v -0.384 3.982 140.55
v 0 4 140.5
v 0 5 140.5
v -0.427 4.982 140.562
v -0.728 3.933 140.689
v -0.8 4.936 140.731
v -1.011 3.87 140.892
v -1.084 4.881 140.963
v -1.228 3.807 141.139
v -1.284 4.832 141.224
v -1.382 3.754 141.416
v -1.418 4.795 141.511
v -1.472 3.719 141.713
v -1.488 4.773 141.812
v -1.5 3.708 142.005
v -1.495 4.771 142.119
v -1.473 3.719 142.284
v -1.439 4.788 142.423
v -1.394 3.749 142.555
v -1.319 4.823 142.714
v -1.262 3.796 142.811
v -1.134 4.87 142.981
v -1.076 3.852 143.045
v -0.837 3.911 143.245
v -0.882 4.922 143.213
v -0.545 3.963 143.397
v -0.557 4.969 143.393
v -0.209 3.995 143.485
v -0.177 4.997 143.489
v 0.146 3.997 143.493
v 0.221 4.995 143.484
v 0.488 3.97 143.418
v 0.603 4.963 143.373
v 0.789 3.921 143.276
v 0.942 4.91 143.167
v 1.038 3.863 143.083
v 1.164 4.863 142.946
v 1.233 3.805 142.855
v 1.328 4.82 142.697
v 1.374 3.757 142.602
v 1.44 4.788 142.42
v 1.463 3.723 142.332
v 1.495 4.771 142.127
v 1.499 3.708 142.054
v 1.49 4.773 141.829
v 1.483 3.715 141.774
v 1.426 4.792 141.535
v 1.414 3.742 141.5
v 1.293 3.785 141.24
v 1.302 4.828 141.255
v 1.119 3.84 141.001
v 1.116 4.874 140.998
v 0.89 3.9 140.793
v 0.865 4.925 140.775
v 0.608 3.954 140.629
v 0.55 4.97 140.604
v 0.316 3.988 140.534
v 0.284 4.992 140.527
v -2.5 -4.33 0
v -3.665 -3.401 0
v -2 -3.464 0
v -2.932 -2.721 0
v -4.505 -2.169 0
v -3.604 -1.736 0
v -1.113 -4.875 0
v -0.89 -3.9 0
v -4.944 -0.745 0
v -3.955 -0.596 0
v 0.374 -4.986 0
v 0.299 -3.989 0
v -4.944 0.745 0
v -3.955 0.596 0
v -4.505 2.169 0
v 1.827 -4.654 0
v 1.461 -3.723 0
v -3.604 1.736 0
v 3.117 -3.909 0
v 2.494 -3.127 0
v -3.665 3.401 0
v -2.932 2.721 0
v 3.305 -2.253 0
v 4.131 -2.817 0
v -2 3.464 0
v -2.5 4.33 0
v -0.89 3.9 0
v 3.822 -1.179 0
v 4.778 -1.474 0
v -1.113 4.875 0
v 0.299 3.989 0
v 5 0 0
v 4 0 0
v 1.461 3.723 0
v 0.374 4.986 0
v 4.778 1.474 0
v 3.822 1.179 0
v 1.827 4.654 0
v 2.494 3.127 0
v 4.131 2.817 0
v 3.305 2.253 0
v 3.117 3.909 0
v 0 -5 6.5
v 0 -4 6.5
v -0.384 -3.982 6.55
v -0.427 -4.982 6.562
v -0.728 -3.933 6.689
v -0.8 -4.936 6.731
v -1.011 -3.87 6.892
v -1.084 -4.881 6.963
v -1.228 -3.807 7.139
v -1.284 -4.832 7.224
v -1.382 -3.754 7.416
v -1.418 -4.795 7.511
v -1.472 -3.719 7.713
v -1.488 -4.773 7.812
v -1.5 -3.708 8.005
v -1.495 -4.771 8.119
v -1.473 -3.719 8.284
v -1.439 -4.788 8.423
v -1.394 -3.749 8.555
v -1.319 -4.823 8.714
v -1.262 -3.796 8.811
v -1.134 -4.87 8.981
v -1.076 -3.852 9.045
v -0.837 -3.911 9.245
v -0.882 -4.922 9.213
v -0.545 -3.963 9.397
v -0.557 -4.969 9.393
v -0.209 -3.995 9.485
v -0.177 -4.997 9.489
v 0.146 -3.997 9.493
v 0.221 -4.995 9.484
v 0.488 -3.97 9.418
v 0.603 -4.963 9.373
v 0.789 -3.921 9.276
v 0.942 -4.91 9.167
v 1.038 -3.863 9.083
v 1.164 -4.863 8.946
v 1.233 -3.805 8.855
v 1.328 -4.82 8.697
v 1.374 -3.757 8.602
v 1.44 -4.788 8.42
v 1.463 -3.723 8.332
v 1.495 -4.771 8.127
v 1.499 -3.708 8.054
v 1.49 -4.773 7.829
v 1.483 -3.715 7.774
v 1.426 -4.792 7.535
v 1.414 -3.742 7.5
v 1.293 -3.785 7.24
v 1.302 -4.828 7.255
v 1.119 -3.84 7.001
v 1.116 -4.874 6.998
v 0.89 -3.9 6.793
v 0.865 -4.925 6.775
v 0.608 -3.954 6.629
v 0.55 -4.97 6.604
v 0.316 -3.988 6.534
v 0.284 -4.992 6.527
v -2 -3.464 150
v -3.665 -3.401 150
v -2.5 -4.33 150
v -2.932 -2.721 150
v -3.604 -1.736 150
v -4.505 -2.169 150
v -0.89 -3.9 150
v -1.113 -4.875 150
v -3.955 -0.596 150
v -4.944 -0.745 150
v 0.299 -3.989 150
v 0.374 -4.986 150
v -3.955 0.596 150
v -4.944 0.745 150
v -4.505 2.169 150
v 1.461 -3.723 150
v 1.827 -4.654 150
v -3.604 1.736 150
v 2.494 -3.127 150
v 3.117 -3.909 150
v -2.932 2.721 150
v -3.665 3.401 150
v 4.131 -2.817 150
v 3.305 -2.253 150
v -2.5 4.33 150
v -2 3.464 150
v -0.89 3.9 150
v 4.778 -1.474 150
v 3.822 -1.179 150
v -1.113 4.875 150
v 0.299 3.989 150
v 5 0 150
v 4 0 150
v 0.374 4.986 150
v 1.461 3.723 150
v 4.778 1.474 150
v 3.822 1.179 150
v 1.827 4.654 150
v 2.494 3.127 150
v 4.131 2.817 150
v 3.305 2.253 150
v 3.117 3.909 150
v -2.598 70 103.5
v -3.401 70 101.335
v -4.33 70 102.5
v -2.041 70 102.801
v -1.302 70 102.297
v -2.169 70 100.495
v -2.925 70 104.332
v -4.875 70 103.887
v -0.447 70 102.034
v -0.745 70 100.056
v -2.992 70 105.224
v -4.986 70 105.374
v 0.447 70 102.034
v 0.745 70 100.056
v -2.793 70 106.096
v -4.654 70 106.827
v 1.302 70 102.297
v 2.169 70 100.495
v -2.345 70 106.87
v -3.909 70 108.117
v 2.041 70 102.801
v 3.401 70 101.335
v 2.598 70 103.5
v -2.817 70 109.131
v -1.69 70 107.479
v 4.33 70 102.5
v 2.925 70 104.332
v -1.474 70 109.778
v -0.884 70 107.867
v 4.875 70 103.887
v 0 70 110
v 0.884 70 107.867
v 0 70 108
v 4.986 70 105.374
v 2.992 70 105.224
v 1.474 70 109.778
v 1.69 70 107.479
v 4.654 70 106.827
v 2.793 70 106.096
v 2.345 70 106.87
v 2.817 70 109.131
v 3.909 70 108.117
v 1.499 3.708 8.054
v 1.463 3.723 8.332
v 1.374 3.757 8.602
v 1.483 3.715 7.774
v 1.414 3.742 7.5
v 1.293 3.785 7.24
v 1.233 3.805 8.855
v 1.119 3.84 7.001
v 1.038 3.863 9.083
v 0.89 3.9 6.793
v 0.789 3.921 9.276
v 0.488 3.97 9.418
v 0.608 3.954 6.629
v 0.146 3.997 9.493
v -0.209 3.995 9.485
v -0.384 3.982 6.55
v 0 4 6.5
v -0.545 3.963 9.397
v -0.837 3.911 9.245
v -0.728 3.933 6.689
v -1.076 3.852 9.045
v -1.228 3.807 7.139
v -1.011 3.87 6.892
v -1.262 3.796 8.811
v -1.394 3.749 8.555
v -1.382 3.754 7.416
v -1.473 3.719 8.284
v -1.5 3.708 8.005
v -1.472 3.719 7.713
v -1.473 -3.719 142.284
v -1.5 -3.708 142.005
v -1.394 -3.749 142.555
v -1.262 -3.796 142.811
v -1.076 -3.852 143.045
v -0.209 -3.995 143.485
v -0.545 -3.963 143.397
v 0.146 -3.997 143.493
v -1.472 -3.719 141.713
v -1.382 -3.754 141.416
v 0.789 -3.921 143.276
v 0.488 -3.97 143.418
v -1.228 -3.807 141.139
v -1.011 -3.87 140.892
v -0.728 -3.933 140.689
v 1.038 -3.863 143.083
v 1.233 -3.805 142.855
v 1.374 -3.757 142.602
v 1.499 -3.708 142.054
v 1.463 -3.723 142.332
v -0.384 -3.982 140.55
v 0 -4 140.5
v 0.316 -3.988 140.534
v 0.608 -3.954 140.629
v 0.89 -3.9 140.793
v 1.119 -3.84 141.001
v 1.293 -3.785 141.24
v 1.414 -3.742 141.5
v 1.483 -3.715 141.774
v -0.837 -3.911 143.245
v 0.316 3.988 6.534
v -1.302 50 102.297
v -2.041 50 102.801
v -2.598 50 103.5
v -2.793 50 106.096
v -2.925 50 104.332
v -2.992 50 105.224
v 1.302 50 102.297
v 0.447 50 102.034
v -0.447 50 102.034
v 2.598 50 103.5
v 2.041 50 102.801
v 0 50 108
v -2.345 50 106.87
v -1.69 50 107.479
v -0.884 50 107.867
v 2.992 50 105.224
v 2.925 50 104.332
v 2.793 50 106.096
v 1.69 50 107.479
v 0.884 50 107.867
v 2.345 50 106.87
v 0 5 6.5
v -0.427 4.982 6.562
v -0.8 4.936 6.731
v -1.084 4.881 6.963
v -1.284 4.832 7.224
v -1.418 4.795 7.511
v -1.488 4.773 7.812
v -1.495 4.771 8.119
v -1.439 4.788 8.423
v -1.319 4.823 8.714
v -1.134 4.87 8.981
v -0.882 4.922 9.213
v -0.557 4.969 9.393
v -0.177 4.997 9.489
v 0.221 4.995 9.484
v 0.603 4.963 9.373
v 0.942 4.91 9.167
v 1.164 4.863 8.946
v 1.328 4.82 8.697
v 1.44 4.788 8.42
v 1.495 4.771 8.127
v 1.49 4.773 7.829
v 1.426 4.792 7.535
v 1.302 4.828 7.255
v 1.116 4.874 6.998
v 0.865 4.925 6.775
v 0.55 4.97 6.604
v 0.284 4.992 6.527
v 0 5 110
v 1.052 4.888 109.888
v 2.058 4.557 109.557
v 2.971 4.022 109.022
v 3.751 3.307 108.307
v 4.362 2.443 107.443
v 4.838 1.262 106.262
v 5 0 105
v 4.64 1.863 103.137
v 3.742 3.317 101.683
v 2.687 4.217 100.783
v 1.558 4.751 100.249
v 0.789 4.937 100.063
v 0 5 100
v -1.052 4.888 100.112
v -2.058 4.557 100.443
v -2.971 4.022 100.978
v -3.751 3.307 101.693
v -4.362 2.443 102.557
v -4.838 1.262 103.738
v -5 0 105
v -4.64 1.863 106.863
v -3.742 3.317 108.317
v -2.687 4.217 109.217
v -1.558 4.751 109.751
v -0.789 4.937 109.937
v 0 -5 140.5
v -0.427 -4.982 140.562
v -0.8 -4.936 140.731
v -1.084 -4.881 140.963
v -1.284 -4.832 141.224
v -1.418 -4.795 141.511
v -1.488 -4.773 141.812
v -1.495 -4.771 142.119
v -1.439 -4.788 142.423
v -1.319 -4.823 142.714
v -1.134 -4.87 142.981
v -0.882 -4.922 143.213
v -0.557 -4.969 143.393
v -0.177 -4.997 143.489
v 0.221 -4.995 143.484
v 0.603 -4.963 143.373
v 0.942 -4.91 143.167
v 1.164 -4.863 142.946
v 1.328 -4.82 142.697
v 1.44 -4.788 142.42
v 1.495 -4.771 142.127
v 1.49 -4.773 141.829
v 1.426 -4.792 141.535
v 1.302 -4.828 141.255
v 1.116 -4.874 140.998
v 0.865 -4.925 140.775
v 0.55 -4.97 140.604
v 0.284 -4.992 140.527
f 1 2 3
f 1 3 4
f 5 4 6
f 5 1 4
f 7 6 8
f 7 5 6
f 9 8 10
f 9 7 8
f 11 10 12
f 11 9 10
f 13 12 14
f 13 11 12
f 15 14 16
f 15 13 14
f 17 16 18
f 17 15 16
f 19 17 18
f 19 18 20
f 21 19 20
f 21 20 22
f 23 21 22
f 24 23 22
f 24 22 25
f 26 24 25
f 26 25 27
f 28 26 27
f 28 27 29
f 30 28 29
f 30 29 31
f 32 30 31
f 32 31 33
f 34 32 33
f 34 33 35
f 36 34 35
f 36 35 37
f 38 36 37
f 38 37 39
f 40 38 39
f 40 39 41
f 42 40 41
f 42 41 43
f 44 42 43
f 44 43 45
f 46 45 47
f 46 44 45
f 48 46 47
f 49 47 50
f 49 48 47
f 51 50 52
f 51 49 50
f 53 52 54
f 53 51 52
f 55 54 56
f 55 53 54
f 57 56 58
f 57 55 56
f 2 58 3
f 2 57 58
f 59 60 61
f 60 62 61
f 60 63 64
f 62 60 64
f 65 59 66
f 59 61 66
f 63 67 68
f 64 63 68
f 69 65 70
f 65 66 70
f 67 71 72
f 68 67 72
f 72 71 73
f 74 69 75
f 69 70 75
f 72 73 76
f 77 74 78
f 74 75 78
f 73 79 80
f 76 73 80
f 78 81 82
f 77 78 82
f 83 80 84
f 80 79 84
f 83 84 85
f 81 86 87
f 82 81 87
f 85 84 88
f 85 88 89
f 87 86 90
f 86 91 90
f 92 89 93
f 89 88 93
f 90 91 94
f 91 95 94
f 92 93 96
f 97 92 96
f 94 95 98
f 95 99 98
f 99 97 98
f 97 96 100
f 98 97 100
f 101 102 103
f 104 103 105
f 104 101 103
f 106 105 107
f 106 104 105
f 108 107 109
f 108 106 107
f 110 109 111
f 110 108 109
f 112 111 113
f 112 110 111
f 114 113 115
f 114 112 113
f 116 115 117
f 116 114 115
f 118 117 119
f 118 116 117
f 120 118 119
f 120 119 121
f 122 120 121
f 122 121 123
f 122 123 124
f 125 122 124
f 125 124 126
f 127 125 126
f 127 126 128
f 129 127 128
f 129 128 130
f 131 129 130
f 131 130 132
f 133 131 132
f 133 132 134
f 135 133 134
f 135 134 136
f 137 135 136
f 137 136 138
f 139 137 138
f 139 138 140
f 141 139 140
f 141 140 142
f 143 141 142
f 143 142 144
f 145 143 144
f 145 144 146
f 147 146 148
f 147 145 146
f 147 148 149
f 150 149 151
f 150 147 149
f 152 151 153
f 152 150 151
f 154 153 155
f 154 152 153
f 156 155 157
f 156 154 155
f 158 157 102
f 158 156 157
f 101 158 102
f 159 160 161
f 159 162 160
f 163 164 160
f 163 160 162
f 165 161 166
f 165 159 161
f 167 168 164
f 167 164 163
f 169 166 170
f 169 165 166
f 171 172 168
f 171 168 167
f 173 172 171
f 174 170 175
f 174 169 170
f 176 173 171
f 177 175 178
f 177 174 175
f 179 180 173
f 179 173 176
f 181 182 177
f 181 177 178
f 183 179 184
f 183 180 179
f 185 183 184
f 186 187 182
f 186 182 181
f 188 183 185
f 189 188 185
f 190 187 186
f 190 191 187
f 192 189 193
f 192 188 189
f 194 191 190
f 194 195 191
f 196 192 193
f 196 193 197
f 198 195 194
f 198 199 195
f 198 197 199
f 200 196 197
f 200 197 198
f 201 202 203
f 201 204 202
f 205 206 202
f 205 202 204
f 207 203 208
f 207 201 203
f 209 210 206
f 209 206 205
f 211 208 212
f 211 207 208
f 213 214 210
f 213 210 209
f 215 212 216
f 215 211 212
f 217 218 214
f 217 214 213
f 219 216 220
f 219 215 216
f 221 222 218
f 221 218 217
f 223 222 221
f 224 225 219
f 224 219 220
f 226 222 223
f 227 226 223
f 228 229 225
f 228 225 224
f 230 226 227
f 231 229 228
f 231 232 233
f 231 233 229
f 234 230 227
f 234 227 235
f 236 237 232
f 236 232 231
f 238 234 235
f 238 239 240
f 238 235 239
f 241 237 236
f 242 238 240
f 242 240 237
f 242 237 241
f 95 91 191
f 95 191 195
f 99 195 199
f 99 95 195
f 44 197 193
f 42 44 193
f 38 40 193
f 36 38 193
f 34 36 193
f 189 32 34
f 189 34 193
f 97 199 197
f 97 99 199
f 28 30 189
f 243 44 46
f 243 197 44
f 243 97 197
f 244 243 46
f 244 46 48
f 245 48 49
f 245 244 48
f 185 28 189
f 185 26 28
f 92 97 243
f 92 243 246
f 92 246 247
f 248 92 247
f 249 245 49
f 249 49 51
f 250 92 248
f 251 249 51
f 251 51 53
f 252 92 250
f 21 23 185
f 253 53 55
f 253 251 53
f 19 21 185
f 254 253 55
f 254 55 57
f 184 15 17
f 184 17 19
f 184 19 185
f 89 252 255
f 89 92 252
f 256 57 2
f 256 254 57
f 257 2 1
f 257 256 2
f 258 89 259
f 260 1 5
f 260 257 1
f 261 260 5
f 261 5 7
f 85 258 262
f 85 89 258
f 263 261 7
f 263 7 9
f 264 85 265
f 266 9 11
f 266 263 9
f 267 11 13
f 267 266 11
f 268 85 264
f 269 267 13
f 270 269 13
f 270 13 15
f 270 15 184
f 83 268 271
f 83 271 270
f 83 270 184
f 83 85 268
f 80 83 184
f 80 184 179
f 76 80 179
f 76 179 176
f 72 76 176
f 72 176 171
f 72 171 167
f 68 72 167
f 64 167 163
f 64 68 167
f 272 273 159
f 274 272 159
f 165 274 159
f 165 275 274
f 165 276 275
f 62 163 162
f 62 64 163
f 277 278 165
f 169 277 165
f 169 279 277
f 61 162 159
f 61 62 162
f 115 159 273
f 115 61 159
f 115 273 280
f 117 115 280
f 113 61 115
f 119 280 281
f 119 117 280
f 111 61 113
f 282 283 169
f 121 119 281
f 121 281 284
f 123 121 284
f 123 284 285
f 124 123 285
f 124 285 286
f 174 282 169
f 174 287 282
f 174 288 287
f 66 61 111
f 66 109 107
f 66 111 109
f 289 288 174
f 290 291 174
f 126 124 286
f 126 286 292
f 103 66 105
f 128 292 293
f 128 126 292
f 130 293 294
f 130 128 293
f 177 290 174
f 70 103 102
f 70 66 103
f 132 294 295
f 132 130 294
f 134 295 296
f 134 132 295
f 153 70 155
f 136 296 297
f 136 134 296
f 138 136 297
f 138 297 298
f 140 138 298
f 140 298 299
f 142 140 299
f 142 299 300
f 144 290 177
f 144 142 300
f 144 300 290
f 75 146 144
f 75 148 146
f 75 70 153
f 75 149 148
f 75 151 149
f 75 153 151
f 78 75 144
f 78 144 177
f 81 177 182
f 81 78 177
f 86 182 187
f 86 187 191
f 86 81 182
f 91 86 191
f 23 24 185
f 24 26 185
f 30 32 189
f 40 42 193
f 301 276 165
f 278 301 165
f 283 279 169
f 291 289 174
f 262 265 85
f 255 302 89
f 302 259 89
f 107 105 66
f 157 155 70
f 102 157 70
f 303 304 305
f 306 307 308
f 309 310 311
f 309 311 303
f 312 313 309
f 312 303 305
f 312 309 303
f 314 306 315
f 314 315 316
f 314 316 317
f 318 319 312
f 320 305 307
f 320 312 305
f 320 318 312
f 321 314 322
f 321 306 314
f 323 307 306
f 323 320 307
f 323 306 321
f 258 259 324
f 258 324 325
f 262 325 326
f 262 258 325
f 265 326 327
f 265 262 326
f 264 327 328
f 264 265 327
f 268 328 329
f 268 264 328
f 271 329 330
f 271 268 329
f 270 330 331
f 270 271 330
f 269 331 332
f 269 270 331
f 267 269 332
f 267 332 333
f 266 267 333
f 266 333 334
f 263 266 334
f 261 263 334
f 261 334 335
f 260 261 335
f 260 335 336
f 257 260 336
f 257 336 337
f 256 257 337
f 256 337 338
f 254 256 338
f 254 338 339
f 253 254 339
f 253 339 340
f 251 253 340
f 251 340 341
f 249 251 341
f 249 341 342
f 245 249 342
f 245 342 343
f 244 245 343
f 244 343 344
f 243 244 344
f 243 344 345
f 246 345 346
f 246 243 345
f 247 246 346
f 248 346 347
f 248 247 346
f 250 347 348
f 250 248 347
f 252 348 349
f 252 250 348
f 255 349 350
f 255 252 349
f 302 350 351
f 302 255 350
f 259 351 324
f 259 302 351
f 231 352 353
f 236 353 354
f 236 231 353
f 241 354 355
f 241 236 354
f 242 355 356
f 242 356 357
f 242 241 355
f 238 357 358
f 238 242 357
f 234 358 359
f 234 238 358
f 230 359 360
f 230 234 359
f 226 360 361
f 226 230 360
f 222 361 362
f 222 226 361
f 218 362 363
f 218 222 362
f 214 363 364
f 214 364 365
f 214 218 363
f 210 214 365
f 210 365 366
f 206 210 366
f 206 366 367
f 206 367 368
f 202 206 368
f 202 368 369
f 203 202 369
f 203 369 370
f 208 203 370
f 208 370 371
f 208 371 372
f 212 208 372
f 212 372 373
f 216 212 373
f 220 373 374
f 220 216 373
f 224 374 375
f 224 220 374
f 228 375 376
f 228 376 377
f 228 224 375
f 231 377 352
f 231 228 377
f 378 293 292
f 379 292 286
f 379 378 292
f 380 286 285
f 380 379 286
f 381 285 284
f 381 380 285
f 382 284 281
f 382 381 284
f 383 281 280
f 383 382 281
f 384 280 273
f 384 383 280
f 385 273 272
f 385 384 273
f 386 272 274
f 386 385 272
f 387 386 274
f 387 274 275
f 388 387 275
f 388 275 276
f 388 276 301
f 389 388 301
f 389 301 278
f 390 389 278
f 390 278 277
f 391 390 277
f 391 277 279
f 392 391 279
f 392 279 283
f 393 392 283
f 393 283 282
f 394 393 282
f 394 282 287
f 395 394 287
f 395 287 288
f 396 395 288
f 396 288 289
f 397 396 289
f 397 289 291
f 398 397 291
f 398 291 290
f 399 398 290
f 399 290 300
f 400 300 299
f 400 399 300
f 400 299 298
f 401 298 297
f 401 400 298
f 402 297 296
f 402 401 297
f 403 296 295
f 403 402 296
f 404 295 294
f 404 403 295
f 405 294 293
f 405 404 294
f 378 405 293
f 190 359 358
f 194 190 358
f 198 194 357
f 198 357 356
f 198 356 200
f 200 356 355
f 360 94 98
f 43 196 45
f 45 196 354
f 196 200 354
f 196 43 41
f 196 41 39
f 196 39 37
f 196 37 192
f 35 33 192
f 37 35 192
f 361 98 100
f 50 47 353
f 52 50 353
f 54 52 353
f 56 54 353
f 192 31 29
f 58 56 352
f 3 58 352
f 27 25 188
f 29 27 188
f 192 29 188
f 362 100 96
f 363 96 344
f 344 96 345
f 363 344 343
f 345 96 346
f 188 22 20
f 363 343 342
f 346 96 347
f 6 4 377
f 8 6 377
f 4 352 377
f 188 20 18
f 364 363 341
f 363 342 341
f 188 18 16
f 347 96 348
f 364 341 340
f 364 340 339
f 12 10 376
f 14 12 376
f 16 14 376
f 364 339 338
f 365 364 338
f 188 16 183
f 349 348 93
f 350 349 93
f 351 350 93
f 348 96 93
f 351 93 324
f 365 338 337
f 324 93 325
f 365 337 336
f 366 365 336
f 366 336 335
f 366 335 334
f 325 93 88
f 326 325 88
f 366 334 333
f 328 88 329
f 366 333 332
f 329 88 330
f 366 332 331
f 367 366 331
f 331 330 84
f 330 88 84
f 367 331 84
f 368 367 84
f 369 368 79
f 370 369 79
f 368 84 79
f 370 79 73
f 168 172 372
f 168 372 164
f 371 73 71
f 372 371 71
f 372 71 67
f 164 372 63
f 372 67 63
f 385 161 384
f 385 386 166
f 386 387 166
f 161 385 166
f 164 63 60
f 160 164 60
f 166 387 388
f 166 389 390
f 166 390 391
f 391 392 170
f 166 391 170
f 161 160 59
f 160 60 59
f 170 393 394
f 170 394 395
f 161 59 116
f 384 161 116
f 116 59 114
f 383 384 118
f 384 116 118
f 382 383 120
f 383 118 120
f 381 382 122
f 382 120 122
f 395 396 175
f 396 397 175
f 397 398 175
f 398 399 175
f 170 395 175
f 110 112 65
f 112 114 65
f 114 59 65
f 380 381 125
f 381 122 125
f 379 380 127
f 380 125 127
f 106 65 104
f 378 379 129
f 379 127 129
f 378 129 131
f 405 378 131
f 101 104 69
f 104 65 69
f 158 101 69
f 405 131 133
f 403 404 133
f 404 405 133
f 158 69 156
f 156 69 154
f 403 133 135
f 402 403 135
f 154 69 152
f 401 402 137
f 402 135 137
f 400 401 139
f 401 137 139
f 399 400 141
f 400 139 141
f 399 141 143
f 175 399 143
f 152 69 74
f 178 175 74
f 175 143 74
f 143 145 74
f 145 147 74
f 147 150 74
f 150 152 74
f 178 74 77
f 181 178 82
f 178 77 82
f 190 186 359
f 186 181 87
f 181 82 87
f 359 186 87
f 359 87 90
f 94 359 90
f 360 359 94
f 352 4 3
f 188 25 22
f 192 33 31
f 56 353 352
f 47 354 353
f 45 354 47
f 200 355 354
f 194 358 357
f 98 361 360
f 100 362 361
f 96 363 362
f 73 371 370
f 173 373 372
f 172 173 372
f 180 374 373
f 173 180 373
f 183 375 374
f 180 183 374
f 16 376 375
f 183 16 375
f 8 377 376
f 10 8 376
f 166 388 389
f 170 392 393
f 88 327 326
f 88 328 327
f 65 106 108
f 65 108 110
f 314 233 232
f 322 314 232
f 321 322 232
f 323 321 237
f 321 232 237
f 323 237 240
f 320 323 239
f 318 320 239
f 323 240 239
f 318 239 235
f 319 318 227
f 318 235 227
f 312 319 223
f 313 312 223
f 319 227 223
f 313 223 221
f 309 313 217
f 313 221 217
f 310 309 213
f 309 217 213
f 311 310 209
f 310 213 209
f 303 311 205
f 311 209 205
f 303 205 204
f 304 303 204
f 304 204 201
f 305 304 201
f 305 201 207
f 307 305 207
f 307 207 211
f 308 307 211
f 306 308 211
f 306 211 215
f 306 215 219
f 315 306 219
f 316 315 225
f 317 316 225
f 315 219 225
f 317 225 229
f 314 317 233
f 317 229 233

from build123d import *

# Parameters (mm, degrees)
SKETCH1_R                            = 5
SKETCH1_R_2                          = 4
BOSS_EXTRUDE1_DEPTH                  = 150
CUT_EXTRUDE1_DEPTH                   = 21
CUT_EXTRUDE1_DEPTH_BACK              = 21
SKETCH2_R                            = 1.5
BOSS_EXTRUDE2_START                  = 10
SKETCH3_R                            = 5
BOSS_EXTRUDE2_DEPTH                  = 60
BOSS_EXTRUDE2_DIRECTION_2_REACH      = 162.167
BOSS_EXTRUDE2_DIRECTION_2_END_RADIUS = 5
SKETCH4_R                            = 3
CUT_EXTRUDE2_DEPTH                   = 20


with BuildPart() as part:
    # Sketch1 → Boss-Extrude1 (new body)
    with BuildSketch(Plane.XY):
        Circle(SKETCH1_R)
        Circle(SKETCH1_R_2, mode=Mode.SUBTRACT)
    extrude(amount=BOSS_EXTRUDE1_DEPTH)

    # Sketch2 → Cut-Extrude1 (cut, two sides: drawn at the far end of the back side and taken through both)
    with BuildSketch(Plane(origin=(0, 0, 0), x_dir=(1, 0, 0), z_dir=(0, 1, 0)).offset(-CUT_EXTRUDE1_DEPTH_BACK)):
        with Locations((0, -142)):
            Circle(SKETCH2_R)
        with Locations((0, -8)):
            Circle(SKETCH2_R)
    extrude(amount=CUT_EXTRUDE1_DEPTH + CUT_EXTRUDE1_DEPTH_BACK, mode=Mode.SUBTRACT)

    # Sketch3 → Boss-Extrude2 (add)
    with BuildSketch(Plane(origin=(0, 0, 0), x_dir=(1, 0, 0), z_dir=(0, 1, 0)).offset(BOSS_EXTRUDE2_START)):
        with Locations((0, -105)):
            Circle(SKETCH3_R)
    extrude(amount=BOSS_EXTRUDE2_DEPTH)

    # Boss-Extrude2 direction 2: up to this cylinder (the profile starts outside it)
    boss_extrude2_direction_2_end = Plane(origin=(0, 0, 105), z_dir=(0, 0, -1)) * Cylinder(BOSS_EXTRUDE2_DIRECTION_2_END_RADIUS, 335.334, mode=Mode.PRIVATE)
    # Sketch3 → Boss-Extrude2 direction 2 (add, up to the surface)
    with BuildSketch(Plane(origin=(0, 0, 0), x_dir=(1, 0, 0), z_dir=(0, 1, 0)).offset(BOSS_EXTRUDE2_START), mode=Mode.PRIVATE) as boss_extrude2_direction_2_sk1:
        with Locations((0, -105)):
            Circle(SKETCH3_R)
    boss_extrude2_direction_2_tool1 = extrude(boss_extrude2_direction_2_sk1.sketch, amount=-BOSS_EXTRUDE2_DIRECTION_2_REACH, mode=Mode.PRIVATE) - boss_extrude2_direction_2_end
    add(boss_extrude2_direction_2_tool1.solids().sort_by_distance((0, 10, 105))[0])

    # Sketch4 → Cut-Extrude2 (cut)
    with BuildSketch(Plane(origin=(0, 70, 0), x_dir=(1, 0, 0), z_dir=(0, 1, 0))):
        with Locations((0, -105)):
            Circle(SKETCH4_R)
    extrude(amount=-CUT_EXTRUDE2_DEPTH, mode=Mode.SUBTRACT)


solid = part.part
